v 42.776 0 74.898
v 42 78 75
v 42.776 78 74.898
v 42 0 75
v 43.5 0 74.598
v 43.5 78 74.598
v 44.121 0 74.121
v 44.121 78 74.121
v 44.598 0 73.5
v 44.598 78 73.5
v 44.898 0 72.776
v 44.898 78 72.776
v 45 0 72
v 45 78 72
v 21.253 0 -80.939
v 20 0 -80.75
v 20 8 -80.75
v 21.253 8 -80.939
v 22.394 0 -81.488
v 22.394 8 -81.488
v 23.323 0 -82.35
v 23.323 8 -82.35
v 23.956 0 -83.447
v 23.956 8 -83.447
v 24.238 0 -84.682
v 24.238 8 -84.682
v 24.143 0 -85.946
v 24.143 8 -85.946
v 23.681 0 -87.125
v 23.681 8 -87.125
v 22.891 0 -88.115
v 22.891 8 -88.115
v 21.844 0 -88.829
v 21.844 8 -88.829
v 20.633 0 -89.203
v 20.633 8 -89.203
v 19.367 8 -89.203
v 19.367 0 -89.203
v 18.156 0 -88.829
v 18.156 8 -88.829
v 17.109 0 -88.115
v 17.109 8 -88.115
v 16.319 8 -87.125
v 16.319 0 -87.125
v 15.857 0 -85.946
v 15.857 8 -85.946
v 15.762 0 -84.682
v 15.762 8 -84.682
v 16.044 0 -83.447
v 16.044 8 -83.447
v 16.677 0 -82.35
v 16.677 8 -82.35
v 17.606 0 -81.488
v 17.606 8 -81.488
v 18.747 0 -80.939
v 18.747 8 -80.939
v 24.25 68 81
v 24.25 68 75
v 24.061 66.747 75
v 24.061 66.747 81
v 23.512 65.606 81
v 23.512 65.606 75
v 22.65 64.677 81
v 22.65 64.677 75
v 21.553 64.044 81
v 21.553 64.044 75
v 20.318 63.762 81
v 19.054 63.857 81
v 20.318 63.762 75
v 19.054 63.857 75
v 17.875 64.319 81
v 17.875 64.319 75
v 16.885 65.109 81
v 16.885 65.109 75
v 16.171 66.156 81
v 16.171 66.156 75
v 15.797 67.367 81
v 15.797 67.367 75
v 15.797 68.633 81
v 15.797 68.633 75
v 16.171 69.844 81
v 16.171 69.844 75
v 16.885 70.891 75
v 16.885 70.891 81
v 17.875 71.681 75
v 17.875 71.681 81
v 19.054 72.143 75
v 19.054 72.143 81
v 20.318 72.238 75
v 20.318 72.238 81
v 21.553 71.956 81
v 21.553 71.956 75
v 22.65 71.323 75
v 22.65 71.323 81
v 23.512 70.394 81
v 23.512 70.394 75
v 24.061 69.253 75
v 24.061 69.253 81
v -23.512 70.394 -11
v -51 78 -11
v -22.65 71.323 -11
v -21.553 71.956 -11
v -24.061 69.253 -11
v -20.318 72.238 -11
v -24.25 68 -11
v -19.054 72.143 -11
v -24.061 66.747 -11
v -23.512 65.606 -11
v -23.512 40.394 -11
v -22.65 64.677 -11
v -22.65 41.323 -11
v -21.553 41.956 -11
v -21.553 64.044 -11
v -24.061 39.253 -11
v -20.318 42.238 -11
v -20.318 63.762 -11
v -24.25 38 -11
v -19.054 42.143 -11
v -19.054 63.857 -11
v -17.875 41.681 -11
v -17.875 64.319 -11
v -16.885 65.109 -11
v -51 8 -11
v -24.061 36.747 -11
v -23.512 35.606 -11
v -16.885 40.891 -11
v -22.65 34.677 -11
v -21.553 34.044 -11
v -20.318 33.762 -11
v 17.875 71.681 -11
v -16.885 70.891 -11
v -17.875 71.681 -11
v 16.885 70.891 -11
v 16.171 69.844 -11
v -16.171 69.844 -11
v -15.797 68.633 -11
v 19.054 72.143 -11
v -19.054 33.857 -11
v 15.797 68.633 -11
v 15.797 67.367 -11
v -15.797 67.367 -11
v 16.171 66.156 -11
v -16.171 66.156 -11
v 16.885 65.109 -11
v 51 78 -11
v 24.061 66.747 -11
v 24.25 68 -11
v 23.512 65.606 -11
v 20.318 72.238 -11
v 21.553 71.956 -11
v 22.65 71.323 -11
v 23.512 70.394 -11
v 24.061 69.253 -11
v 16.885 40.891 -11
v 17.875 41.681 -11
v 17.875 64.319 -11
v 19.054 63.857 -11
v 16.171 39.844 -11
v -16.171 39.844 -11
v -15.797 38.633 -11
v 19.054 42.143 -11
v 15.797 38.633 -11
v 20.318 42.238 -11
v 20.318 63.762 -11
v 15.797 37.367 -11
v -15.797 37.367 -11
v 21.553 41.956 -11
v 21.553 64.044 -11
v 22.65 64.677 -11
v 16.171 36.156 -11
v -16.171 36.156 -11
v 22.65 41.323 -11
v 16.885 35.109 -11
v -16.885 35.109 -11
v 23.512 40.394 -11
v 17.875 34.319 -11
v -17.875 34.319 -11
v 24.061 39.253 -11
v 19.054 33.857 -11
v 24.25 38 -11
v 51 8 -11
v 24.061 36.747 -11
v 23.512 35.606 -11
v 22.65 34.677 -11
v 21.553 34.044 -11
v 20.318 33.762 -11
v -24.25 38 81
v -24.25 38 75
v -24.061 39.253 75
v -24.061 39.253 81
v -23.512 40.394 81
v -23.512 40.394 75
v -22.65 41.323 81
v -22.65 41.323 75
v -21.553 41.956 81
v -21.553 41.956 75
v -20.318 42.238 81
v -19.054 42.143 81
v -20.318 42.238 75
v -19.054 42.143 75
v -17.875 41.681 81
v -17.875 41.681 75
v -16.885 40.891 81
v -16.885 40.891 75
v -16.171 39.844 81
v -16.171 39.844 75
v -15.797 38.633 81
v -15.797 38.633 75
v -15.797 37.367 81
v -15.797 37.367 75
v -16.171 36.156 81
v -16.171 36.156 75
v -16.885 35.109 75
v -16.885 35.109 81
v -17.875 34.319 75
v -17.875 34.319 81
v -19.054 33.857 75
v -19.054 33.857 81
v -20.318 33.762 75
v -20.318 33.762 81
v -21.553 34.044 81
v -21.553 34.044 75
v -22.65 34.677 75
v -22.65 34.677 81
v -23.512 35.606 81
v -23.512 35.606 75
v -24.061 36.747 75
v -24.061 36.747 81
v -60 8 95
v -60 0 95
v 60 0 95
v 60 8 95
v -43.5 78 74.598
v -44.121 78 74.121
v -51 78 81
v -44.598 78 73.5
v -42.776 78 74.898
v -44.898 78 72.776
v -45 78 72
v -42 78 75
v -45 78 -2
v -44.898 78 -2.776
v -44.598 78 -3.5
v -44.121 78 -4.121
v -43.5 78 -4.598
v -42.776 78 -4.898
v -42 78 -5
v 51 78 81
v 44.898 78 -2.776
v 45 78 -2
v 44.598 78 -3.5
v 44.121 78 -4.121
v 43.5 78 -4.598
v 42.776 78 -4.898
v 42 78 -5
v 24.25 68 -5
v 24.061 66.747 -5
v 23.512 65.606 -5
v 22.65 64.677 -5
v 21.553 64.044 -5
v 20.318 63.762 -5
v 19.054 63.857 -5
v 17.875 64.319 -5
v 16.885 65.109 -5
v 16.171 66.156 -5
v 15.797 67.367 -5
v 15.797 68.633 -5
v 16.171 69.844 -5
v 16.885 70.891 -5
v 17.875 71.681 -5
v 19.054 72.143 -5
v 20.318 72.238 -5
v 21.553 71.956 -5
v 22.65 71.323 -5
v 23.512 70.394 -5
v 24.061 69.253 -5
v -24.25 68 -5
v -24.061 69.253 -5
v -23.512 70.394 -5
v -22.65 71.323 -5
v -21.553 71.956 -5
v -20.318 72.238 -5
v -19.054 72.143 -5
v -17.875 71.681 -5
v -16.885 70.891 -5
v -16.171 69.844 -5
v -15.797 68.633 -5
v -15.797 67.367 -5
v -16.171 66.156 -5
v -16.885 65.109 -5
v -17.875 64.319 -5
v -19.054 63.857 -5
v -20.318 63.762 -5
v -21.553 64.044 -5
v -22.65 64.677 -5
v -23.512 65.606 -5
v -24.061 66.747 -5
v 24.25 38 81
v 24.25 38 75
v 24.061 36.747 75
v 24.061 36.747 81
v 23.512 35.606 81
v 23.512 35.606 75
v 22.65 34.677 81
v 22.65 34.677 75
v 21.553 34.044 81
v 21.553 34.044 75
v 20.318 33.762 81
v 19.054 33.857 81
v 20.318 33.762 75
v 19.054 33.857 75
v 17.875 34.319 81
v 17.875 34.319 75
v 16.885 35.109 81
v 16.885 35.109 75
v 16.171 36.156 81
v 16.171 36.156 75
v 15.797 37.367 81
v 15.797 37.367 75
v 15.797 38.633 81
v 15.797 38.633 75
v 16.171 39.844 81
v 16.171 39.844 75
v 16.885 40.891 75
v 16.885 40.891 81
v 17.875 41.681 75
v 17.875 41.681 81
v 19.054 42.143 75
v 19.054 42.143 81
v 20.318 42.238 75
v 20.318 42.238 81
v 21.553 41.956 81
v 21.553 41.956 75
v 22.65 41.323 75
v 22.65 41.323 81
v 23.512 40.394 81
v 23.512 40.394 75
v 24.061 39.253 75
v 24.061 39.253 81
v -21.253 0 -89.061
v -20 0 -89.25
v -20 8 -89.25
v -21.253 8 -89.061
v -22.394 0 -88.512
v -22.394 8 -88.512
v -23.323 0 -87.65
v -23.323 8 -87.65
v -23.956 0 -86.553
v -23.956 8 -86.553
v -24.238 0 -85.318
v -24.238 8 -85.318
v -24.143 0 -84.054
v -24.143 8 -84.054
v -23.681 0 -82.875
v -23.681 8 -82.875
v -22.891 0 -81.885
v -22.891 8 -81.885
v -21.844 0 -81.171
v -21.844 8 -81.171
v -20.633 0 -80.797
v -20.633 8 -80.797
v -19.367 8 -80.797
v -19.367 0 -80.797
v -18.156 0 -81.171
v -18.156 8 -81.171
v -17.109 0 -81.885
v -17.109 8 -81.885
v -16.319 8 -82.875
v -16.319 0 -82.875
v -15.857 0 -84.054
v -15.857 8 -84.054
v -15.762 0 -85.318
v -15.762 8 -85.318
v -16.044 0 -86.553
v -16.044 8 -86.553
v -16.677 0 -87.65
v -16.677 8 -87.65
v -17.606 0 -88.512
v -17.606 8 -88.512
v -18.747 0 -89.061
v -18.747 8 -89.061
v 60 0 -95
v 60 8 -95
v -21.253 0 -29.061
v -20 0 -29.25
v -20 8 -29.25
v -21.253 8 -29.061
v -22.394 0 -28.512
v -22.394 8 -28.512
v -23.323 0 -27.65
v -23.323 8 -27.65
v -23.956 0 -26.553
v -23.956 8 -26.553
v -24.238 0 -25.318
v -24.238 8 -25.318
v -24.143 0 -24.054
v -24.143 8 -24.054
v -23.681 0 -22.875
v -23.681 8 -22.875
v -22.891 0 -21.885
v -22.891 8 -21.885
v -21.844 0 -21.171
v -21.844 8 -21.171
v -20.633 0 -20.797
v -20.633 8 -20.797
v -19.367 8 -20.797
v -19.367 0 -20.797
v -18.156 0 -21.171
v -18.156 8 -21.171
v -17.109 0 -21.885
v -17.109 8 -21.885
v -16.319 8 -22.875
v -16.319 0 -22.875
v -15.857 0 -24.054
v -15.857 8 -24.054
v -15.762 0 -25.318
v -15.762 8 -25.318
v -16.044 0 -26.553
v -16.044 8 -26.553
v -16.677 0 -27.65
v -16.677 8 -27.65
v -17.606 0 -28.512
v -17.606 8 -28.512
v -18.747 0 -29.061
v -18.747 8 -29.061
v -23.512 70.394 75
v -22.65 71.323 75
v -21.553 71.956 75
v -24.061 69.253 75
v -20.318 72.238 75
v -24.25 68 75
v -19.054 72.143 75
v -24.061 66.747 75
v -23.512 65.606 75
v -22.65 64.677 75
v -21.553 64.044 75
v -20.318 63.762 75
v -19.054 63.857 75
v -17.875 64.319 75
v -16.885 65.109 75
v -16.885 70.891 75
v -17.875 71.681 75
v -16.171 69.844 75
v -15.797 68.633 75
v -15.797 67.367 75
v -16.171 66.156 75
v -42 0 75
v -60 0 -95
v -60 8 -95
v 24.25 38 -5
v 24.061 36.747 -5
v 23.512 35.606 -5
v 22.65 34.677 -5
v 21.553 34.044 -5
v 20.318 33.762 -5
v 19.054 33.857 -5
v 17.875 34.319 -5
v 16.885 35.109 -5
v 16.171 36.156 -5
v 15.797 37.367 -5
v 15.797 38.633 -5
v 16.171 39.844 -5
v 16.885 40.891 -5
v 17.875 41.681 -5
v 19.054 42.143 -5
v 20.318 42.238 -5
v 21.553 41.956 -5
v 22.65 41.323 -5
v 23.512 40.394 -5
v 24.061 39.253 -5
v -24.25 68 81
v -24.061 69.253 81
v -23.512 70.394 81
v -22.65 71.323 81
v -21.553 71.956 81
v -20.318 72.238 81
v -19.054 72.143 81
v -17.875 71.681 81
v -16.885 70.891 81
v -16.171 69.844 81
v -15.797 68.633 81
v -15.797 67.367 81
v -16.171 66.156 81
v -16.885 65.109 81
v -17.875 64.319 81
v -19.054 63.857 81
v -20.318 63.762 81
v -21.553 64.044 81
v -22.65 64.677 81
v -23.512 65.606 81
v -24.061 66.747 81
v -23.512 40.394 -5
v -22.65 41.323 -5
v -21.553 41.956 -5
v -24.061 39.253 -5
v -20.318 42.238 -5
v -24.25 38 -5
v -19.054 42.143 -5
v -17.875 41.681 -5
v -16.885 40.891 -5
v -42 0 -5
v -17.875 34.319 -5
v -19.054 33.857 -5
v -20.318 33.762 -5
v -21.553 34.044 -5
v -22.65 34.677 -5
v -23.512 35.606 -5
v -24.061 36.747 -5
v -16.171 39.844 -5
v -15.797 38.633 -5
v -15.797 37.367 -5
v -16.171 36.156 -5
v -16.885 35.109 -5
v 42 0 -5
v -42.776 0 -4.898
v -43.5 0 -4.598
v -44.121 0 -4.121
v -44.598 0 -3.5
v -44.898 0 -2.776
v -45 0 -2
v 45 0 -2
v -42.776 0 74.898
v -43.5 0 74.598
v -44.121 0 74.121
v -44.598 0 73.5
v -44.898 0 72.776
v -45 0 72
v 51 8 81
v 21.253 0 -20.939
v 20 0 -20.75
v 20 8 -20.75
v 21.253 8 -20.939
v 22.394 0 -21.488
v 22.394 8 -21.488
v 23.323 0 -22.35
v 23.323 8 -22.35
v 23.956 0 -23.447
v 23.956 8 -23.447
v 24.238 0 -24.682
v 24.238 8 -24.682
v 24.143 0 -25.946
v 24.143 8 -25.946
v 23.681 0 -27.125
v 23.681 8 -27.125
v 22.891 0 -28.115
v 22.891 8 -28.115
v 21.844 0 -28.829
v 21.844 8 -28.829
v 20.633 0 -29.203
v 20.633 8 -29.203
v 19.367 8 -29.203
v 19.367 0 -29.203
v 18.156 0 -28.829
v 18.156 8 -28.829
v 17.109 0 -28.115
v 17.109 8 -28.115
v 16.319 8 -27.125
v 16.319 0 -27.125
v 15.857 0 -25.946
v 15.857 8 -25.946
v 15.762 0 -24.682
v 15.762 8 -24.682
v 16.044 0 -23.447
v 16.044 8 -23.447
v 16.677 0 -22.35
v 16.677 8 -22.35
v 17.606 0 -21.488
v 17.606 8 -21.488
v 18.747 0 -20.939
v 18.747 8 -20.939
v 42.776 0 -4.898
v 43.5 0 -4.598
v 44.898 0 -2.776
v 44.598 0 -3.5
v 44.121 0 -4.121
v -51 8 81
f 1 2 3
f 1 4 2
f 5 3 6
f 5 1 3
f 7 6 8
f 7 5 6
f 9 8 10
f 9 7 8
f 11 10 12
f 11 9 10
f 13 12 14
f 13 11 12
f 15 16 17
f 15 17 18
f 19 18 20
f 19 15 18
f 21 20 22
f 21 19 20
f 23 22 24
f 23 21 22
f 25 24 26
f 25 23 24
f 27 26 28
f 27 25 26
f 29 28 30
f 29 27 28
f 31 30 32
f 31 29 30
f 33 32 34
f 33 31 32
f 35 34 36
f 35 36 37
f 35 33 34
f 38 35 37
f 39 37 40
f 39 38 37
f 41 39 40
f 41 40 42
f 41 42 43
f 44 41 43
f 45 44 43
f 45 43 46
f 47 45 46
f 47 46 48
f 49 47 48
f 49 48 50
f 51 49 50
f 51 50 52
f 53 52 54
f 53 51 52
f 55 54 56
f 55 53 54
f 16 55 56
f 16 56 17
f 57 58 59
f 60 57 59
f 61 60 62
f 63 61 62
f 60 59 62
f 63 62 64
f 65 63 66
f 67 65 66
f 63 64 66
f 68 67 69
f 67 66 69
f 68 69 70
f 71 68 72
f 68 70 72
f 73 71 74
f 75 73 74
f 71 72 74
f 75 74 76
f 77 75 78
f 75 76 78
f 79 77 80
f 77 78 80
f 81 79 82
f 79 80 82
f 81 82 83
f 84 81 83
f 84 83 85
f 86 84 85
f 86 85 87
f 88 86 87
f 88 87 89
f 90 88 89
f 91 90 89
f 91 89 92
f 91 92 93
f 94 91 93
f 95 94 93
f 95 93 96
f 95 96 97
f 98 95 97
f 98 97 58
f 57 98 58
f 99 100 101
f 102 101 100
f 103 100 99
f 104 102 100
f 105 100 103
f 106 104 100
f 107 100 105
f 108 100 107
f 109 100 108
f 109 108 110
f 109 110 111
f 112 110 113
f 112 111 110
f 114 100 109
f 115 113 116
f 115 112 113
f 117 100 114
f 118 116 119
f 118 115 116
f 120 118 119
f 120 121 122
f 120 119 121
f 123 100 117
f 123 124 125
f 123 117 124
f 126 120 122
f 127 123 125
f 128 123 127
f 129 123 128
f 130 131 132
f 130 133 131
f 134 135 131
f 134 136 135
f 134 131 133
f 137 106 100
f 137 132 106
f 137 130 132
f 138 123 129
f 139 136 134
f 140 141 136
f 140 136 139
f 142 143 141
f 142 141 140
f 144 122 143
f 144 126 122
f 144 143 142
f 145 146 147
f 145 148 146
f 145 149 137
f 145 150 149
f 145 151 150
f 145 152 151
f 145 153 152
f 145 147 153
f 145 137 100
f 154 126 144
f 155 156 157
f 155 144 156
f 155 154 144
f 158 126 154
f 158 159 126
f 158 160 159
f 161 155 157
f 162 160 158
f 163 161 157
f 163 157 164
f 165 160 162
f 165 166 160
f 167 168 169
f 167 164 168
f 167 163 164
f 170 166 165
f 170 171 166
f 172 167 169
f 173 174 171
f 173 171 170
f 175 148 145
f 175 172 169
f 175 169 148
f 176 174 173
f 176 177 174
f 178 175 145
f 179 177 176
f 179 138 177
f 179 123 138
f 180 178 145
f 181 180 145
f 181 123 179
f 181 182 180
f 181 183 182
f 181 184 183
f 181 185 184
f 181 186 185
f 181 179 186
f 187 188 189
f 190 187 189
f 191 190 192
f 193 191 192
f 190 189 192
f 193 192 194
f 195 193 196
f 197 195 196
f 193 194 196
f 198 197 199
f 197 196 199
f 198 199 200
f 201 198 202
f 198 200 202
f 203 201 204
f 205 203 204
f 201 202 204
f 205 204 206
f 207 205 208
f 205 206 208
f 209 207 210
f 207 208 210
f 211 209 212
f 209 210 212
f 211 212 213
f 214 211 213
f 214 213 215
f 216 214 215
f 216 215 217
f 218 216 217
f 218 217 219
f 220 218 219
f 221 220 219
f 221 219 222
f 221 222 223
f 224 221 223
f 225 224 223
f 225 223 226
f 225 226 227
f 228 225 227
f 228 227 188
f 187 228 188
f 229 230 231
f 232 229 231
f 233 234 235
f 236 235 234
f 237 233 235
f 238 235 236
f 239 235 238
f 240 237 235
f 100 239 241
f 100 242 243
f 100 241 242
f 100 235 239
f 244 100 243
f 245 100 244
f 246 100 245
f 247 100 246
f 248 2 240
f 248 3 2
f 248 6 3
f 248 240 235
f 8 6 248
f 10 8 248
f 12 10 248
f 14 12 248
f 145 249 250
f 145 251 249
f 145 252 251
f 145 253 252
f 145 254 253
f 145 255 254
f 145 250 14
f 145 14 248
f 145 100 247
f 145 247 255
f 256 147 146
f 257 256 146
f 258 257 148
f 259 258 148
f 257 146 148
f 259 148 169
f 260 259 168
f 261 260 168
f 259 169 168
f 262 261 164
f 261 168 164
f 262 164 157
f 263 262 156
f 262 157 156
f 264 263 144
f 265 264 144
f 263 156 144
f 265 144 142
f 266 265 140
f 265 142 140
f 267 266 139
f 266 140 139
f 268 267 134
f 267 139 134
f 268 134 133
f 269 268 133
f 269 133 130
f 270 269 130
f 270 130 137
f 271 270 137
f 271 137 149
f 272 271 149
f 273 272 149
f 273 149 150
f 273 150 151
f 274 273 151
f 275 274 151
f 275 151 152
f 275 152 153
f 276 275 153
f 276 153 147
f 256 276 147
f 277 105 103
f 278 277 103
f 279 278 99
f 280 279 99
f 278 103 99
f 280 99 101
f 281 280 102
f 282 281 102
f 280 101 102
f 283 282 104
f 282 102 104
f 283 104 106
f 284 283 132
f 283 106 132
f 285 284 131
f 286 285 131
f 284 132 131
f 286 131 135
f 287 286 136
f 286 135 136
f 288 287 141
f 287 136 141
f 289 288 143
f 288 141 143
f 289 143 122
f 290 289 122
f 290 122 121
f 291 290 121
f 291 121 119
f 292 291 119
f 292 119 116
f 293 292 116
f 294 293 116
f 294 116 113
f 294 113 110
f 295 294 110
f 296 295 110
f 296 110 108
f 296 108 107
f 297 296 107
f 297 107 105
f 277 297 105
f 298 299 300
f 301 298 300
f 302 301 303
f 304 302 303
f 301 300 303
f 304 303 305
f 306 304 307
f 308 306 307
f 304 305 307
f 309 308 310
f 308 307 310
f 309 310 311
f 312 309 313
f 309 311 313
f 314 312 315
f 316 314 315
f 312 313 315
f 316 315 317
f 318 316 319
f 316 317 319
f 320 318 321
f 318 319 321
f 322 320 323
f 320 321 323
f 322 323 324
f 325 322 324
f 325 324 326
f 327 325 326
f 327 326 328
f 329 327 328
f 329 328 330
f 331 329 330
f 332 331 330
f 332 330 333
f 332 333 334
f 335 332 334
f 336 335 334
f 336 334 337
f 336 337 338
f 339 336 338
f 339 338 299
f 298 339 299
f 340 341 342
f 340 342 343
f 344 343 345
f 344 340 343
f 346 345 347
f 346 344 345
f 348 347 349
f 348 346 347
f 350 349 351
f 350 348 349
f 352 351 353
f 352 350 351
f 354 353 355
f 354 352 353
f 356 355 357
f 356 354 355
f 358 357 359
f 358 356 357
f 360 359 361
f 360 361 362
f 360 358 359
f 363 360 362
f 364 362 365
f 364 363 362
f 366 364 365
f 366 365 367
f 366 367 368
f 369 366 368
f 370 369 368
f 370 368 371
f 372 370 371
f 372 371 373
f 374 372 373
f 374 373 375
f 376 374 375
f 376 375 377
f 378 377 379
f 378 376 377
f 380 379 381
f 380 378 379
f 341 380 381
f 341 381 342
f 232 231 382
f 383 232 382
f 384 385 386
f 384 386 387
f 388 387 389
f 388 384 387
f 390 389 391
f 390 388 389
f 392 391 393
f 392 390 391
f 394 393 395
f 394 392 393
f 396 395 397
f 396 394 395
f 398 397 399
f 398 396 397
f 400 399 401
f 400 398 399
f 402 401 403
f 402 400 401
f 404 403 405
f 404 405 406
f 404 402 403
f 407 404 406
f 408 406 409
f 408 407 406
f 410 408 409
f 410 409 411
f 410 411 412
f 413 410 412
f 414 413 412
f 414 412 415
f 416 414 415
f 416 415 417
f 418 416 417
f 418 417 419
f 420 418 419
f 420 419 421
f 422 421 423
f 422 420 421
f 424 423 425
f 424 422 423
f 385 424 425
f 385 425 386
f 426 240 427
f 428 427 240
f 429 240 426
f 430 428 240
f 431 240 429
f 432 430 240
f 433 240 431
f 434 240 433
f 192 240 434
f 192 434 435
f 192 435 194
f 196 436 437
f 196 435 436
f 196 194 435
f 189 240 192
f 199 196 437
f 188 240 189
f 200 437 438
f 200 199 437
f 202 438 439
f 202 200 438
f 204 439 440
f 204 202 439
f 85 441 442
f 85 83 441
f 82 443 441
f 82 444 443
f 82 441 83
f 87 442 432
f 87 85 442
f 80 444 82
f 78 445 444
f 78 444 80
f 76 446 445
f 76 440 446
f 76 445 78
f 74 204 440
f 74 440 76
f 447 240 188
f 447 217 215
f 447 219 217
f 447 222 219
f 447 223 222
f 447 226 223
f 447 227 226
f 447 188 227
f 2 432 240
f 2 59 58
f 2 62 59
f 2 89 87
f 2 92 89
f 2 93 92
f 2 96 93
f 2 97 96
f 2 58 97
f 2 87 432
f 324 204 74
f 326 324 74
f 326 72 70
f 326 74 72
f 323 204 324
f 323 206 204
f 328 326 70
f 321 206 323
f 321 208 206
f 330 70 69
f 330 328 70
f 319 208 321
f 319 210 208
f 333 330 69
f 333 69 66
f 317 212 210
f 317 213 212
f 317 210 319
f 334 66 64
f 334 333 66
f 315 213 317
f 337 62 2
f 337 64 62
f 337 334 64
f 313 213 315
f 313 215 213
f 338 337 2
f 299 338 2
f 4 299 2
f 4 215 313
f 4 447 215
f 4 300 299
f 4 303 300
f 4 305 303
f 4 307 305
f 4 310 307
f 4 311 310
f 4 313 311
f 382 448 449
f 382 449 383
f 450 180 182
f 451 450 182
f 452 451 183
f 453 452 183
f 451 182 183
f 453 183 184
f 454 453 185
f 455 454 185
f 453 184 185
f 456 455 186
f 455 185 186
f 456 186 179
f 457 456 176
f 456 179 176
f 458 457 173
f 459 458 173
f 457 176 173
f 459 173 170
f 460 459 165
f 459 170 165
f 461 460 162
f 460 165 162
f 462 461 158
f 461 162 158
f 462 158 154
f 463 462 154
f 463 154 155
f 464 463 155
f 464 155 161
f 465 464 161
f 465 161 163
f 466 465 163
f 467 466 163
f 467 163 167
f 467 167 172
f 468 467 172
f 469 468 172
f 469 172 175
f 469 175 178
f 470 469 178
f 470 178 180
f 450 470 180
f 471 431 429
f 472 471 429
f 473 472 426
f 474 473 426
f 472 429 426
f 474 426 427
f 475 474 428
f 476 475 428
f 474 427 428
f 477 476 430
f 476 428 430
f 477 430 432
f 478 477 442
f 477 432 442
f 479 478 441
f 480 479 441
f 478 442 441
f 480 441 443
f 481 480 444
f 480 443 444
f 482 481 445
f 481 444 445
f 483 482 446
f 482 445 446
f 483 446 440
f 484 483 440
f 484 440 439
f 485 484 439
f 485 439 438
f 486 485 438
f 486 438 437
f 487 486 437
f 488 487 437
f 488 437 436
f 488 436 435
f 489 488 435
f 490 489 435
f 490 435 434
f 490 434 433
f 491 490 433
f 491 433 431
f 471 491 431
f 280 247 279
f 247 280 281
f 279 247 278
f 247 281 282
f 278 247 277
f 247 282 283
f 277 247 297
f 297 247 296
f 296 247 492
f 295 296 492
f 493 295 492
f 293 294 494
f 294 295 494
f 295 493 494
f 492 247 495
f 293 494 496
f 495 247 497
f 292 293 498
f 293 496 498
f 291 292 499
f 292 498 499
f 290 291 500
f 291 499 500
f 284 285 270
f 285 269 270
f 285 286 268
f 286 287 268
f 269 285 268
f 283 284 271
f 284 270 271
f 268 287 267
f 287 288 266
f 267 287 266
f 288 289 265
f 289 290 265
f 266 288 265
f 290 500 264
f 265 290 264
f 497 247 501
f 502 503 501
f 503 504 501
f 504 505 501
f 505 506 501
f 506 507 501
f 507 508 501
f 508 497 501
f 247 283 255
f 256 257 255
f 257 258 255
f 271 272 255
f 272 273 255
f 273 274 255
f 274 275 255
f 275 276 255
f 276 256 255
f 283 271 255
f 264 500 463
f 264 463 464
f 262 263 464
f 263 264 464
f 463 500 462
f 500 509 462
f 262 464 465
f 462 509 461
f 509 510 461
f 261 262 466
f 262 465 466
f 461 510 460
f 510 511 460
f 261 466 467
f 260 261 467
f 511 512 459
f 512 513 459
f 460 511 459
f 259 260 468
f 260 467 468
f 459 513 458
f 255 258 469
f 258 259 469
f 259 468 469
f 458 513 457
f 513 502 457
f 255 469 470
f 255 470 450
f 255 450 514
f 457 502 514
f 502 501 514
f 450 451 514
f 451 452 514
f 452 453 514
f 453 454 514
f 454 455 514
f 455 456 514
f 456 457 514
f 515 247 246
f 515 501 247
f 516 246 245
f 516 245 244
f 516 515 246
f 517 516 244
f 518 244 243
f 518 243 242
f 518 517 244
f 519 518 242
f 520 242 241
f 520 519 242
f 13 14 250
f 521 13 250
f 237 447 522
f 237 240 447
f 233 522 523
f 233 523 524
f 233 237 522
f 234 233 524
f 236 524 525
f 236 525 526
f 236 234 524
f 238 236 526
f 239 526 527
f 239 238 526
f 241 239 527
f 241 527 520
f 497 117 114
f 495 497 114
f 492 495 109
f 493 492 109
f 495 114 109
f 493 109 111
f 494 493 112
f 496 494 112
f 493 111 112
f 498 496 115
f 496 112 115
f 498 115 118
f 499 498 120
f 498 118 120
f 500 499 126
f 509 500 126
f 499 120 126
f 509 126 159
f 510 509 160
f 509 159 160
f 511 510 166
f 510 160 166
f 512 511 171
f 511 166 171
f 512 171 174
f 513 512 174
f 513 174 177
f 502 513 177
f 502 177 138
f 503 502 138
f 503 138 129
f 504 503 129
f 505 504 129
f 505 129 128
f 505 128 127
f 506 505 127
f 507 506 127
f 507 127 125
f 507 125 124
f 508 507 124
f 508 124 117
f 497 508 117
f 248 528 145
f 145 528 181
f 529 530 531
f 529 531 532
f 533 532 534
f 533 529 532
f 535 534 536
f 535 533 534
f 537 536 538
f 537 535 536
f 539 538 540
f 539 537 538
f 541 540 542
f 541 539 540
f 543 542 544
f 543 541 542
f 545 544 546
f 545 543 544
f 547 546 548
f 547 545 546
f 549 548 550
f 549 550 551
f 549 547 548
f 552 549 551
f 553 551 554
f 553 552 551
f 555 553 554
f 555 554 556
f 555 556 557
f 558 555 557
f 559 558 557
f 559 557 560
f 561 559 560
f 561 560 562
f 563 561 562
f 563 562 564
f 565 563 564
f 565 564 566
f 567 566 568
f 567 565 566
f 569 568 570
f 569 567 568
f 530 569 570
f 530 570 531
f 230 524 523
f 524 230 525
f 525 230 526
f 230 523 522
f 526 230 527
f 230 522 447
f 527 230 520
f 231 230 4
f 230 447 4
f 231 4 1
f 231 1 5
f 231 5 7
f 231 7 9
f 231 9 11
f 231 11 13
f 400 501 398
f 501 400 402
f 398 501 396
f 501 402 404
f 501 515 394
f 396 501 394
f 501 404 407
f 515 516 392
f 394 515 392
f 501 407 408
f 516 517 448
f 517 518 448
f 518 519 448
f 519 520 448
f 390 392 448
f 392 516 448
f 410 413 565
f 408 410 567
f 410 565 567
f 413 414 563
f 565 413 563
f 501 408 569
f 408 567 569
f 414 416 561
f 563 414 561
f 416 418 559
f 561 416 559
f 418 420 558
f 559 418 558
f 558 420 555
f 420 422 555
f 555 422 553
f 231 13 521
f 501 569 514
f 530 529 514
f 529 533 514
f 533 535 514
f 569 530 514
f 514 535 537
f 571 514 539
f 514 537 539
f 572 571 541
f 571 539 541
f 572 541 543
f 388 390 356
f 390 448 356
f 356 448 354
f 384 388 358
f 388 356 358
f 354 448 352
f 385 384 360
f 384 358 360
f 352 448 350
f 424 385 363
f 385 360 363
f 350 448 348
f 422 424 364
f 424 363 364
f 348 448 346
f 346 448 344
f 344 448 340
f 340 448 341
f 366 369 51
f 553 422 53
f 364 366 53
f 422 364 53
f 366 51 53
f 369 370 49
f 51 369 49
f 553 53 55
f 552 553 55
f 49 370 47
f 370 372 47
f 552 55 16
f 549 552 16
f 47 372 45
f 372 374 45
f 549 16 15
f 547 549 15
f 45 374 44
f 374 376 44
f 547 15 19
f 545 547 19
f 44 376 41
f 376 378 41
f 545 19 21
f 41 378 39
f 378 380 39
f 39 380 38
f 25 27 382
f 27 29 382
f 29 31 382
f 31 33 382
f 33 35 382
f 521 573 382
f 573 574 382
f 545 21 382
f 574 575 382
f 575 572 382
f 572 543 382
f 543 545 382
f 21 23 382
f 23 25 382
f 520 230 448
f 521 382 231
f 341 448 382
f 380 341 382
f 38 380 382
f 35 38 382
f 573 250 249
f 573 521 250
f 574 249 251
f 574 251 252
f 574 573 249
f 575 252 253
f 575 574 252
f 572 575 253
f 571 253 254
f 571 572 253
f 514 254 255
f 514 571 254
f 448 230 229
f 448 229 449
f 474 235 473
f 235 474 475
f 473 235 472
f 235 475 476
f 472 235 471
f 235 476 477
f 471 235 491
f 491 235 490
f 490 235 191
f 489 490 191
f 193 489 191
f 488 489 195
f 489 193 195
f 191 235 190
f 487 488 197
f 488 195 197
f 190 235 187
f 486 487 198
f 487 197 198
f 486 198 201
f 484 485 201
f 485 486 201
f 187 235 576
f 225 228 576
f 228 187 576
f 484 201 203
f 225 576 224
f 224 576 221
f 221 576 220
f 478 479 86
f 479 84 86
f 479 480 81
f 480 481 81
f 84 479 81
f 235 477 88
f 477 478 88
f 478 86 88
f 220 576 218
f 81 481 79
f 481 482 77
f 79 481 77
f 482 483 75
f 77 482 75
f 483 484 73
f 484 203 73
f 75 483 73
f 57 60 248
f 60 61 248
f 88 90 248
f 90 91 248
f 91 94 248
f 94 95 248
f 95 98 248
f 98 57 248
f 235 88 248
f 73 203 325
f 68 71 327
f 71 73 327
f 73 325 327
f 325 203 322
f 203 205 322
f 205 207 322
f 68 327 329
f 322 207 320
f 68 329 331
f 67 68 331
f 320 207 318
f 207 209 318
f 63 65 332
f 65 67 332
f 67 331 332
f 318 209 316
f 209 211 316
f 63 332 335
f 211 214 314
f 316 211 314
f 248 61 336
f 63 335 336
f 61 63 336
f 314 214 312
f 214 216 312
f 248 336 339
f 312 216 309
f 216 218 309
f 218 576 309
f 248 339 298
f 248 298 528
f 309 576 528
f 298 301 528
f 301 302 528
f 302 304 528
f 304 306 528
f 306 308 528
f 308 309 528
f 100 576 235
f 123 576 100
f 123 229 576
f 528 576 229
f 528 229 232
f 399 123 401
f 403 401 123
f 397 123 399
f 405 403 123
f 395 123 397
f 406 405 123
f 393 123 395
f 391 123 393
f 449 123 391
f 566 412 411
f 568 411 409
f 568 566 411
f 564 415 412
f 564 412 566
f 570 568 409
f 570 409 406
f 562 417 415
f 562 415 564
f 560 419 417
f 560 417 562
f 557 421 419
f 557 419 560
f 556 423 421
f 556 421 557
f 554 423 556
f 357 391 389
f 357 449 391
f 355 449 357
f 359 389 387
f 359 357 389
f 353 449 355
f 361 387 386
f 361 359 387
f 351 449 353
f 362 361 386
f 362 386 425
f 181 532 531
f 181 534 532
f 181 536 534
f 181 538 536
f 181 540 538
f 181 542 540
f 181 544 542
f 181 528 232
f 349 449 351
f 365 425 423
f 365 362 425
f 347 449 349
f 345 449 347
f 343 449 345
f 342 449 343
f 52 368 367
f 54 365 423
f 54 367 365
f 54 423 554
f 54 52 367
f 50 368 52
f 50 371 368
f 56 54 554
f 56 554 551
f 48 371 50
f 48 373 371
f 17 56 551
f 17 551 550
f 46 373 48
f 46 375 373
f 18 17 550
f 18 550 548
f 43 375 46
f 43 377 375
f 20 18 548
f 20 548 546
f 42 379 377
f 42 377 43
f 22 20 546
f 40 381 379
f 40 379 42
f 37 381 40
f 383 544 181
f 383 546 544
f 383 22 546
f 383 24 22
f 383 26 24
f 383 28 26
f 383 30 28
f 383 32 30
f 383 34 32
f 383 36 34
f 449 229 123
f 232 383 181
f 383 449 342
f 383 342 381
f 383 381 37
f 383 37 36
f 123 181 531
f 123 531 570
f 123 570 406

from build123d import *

# Parameters (mm, degrees)
SKETCH_1_W          = 120
SKETCH_1_H          = 190
SKETCH_1_R          = 4.25
SKETCH_1_W_2        = 90
SKETCH_1_H_2        = 80
EXTRUDE_1_DEPTH     = 8
SKETCH_2_W          = 102
SKETCH_2_H          = 92
SKETCH_2_W_2        = 90
SKETCH_2_H_2        = 80
EXTRUDE_2_DEPTH     = 70
SKETCH_3_R          = 4.25
CUT_EXTRUDE_1_DEPTH = 145.637477854
FILLET_1_R          = 3


with BuildPart() as part:
    # 草图1 → 凸台-拉伸1 (new body)
    with BuildSketch(Plane(origin=(0, 0, 0), x_dir=(1, 0, 0), z_dir=(0, 1, 0))):
        Rectangle(SKETCH_1_W, SKETCH_1_H)
        with Locations(Location((20, 85, 0), (0, 0, 270))):
            Circle(SKETCH_1_R, mode=Mode.SUBTRACT)
        with Locations(Location((20, 25, 0), (0, 0, 270))):
            Circle(SKETCH_1_R, mode=Mode.SUBTRACT)
        with Locations(Location((-20, 85, 0), (0, 0, 90))):
            Circle(SKETCH_1_R, mode=Mode.SUBTRACT)
        with Locations(Location((-20, 25, 0), (0, 0, 90))):
            Circle(SKETCH_1_R, mode=Mode.SUBTRACT)
        with Locations((0, -35)):
            Rectangle(SKETCH_1_W_2, SKETCH_1_H_2, mode=Mode.SUBTRACT)
    extrude(amount=EXTRUDE_1_DEPTH)

    # 草图2 → 凸台-拉伸2 (add)
    with BuildSketch(Plane(origin=(0, 8, 0), x_dir=(1, 0, 0), z_dir=(0, 1, 0))):
        with Locations((0, -35)):
            Rectangle(SKETCH_2_W, SKETCH_2_H)
        with Locations((0, -35)):
            Rectangle(SKETCH_2_W_2, SKETCH_2_H_2, mode=Mode.SUBTRACT)
    extrude(amount=EXTRUDE_2_DEPTH)

    # 草图3 → 切除-拉伸1 (cut, through all)
    with BuildSketch(Plane(origin=(0, 0, -11), x_dir=(-1, 0, 0), z_dir=(0, 0, -1))):
        with Locations((20, 68)):
            Circle(SKETCH_3_R)
        with Locations((20, 38)):
            Circle(SKETCH_3_R)
        with Locations(Location((-20, 38, 0), (0, 0, 180))):
            Circle(SKETCH_3_R)
        with Locations(Location((-20, 68, 0), (0, 0, 180))):
            Circle(SKETCH_3_R)
    extrude(amount=-CUT_EXTRUDE_1_DEPTH, mode=Mode.SUBTRACT)

    # 圆角1
    fillet_1_edges = [part.edges().sort_by_distance(p)[0] for p in [
        (-45, 39, -5),
        (-45, 39, 75),
        (45, 39, 75),
        (45, 39, -5),
    ]]
    fillet(fillet_1_edges, radius=FILLET_1_R)


solid = part.part
